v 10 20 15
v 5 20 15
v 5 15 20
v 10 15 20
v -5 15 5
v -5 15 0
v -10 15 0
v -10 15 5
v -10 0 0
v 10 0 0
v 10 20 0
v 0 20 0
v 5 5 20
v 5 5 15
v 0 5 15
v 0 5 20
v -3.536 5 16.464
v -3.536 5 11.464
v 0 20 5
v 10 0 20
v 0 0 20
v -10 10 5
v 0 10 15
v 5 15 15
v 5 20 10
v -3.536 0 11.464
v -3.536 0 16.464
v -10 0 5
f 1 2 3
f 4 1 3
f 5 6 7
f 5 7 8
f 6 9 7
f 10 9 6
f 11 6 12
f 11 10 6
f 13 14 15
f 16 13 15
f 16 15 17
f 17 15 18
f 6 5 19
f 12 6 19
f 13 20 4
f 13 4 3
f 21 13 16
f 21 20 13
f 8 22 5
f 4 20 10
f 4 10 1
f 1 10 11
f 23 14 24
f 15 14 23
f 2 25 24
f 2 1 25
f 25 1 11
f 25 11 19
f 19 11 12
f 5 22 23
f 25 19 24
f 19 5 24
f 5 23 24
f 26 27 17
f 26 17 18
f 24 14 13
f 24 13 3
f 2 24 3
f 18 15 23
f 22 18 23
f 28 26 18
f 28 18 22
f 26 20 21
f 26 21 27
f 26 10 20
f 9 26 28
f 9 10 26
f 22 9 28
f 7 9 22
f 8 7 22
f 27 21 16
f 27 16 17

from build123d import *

# Parameters (mm, degrees)
BOSS_EXTRUDE1_DEPTH = 20
SKETCH3_W           = 5
SKETCH3_H           = 20
BOSS_EXTRUDE2_DEPTH = 5
CUT_EXTRUDE1_DEPTH  = 5
SKETCH5_W           = 5
SKETCH5_H           = 20
BOSS_EXTRUDE3_DEPTH = 5
CUT_EXTRUDE2_DEPTH  = 5
SKETCH7_W           = 5
SKETCH7_H           = 15
BOSS_EXTRUDE4_DEPTH = 5
BOSS_EXTRUDE6_DEPTH = 20
CUT_EXTRUDE4_DEPTH  = 31
BOSS_EXTRUDE7_DEPTH = 5


with BuildPart() as part:
    # Sketch2 → Boss-Extrude1 (new body)
    with BuildSketch(Plane(origin=(0, 0, 0), x_dir=(1, 0, 0), z_dir=(0, 1, 0))):
        Polygon((0, 0), (10, 0), (10, -15), (5, -15), (5, -10), (0, -5), align=None)
    extrude(amount=BOSS_EXTRUDE1_DEPTH)

    # Sketch3 → Boss-Extrude2 (add)
    with BuildSketch(Plane.XY.offset(15)):
        with Locations((7.5, 10)):
            Rectangle(SKETCH3_W, SKETCH3_H)
    extrude(amount=BOSS_EXTRUDE2_DEPTH)

    # Sketch4 → Cut-Extrude1 (cut)
    with BuildSketch(Plane.ZY.offset(-5)):
        Polygon((15, 20), (20, 15), (20, 20), align=None)
    extrude(amount=-CUT_EXTRUDE1_DEPTH, mode=Mode.SUBTRACT)

    # Sketch5 → Boss-Extrude3 (add)
    with BuildSketch(Plane.ZY):
        with Locations((2.5, 10)):
            Rectangle(SKETCH5_W, SKETCH5_H)
    extrude(amount=BOSS_EXTRUDE3_DEPTH)

    # Sketch6 → Cut-Extrude2 (cut)
    with BuildSketch(Plane.XY.offset(5)):
        Polygon((0, 20), (-5, 20), (-5, 15), align=None)
    extrude(amount=-CUT_EXTRUDE2_DEPTH, mode=Mode.SUBTRACT)

    # Sketch7 → Boss-Extrude4 (add)
    with BuildSketch(Plane.ZY.offset(5)):
        with Locations((2.5, 7.5)):
            Rectangle(SKETCH7_W, SKETCH7_H)
    extrude(amount=BOSS_EXTRUDE4_DEPTH)

    # Sketch8 → Boss-Extrude6 (add)
    with BuildSketch(Plane(origin=(0, 0, 0), x_dir=(-1, 0, 0), z_dir=(0, -1, 0))):
        Polygon((10, -5), (0, -5), (-5, -10), (-5, -15), (0, -15), align=None)
    extrude(amount=-BOSS_EXTRUDE6_DEPTH)

    # 3DSketch2 → Cut-Extrude4 (cut, along a direction that is not the sketch's normal)
    with BuildSketch(Plane(origin=(0, 20, 5), x_dir=(-0.7071067811865475, -0.7071067811865476, 0), z_dir=(-0.5773502691896257, 0.5773502691896257, 0.5773502691896257))):
        Polygon((0, 0), (-3.535533906, 6.123724357), (0, 12.247448714), (7.071067812, 12.247448714), (14.142135624, 0), align=None)
    extrude(amount=CUT_EXTRUDE4_DEPTH, dir=(0, 1, 0), mode=Mode.SUBTRACT)

    # Sketch9 → Boss-Extrude7 (add)
    with BuildSketch(Plane(origin=(0, 0, 0), x_dir=(-1, 0, 0), z_dir=(0, -1, 0))):
        Polygon((0, -15), (-5, -15), (-5, -20), (0, -20), (3.535533906, -16.464466094), (3.535533906, -11.464466094), align=None)
    extrude(amount=-BOSS_EXTRUDE7_DEPTH)


solid = part.part
